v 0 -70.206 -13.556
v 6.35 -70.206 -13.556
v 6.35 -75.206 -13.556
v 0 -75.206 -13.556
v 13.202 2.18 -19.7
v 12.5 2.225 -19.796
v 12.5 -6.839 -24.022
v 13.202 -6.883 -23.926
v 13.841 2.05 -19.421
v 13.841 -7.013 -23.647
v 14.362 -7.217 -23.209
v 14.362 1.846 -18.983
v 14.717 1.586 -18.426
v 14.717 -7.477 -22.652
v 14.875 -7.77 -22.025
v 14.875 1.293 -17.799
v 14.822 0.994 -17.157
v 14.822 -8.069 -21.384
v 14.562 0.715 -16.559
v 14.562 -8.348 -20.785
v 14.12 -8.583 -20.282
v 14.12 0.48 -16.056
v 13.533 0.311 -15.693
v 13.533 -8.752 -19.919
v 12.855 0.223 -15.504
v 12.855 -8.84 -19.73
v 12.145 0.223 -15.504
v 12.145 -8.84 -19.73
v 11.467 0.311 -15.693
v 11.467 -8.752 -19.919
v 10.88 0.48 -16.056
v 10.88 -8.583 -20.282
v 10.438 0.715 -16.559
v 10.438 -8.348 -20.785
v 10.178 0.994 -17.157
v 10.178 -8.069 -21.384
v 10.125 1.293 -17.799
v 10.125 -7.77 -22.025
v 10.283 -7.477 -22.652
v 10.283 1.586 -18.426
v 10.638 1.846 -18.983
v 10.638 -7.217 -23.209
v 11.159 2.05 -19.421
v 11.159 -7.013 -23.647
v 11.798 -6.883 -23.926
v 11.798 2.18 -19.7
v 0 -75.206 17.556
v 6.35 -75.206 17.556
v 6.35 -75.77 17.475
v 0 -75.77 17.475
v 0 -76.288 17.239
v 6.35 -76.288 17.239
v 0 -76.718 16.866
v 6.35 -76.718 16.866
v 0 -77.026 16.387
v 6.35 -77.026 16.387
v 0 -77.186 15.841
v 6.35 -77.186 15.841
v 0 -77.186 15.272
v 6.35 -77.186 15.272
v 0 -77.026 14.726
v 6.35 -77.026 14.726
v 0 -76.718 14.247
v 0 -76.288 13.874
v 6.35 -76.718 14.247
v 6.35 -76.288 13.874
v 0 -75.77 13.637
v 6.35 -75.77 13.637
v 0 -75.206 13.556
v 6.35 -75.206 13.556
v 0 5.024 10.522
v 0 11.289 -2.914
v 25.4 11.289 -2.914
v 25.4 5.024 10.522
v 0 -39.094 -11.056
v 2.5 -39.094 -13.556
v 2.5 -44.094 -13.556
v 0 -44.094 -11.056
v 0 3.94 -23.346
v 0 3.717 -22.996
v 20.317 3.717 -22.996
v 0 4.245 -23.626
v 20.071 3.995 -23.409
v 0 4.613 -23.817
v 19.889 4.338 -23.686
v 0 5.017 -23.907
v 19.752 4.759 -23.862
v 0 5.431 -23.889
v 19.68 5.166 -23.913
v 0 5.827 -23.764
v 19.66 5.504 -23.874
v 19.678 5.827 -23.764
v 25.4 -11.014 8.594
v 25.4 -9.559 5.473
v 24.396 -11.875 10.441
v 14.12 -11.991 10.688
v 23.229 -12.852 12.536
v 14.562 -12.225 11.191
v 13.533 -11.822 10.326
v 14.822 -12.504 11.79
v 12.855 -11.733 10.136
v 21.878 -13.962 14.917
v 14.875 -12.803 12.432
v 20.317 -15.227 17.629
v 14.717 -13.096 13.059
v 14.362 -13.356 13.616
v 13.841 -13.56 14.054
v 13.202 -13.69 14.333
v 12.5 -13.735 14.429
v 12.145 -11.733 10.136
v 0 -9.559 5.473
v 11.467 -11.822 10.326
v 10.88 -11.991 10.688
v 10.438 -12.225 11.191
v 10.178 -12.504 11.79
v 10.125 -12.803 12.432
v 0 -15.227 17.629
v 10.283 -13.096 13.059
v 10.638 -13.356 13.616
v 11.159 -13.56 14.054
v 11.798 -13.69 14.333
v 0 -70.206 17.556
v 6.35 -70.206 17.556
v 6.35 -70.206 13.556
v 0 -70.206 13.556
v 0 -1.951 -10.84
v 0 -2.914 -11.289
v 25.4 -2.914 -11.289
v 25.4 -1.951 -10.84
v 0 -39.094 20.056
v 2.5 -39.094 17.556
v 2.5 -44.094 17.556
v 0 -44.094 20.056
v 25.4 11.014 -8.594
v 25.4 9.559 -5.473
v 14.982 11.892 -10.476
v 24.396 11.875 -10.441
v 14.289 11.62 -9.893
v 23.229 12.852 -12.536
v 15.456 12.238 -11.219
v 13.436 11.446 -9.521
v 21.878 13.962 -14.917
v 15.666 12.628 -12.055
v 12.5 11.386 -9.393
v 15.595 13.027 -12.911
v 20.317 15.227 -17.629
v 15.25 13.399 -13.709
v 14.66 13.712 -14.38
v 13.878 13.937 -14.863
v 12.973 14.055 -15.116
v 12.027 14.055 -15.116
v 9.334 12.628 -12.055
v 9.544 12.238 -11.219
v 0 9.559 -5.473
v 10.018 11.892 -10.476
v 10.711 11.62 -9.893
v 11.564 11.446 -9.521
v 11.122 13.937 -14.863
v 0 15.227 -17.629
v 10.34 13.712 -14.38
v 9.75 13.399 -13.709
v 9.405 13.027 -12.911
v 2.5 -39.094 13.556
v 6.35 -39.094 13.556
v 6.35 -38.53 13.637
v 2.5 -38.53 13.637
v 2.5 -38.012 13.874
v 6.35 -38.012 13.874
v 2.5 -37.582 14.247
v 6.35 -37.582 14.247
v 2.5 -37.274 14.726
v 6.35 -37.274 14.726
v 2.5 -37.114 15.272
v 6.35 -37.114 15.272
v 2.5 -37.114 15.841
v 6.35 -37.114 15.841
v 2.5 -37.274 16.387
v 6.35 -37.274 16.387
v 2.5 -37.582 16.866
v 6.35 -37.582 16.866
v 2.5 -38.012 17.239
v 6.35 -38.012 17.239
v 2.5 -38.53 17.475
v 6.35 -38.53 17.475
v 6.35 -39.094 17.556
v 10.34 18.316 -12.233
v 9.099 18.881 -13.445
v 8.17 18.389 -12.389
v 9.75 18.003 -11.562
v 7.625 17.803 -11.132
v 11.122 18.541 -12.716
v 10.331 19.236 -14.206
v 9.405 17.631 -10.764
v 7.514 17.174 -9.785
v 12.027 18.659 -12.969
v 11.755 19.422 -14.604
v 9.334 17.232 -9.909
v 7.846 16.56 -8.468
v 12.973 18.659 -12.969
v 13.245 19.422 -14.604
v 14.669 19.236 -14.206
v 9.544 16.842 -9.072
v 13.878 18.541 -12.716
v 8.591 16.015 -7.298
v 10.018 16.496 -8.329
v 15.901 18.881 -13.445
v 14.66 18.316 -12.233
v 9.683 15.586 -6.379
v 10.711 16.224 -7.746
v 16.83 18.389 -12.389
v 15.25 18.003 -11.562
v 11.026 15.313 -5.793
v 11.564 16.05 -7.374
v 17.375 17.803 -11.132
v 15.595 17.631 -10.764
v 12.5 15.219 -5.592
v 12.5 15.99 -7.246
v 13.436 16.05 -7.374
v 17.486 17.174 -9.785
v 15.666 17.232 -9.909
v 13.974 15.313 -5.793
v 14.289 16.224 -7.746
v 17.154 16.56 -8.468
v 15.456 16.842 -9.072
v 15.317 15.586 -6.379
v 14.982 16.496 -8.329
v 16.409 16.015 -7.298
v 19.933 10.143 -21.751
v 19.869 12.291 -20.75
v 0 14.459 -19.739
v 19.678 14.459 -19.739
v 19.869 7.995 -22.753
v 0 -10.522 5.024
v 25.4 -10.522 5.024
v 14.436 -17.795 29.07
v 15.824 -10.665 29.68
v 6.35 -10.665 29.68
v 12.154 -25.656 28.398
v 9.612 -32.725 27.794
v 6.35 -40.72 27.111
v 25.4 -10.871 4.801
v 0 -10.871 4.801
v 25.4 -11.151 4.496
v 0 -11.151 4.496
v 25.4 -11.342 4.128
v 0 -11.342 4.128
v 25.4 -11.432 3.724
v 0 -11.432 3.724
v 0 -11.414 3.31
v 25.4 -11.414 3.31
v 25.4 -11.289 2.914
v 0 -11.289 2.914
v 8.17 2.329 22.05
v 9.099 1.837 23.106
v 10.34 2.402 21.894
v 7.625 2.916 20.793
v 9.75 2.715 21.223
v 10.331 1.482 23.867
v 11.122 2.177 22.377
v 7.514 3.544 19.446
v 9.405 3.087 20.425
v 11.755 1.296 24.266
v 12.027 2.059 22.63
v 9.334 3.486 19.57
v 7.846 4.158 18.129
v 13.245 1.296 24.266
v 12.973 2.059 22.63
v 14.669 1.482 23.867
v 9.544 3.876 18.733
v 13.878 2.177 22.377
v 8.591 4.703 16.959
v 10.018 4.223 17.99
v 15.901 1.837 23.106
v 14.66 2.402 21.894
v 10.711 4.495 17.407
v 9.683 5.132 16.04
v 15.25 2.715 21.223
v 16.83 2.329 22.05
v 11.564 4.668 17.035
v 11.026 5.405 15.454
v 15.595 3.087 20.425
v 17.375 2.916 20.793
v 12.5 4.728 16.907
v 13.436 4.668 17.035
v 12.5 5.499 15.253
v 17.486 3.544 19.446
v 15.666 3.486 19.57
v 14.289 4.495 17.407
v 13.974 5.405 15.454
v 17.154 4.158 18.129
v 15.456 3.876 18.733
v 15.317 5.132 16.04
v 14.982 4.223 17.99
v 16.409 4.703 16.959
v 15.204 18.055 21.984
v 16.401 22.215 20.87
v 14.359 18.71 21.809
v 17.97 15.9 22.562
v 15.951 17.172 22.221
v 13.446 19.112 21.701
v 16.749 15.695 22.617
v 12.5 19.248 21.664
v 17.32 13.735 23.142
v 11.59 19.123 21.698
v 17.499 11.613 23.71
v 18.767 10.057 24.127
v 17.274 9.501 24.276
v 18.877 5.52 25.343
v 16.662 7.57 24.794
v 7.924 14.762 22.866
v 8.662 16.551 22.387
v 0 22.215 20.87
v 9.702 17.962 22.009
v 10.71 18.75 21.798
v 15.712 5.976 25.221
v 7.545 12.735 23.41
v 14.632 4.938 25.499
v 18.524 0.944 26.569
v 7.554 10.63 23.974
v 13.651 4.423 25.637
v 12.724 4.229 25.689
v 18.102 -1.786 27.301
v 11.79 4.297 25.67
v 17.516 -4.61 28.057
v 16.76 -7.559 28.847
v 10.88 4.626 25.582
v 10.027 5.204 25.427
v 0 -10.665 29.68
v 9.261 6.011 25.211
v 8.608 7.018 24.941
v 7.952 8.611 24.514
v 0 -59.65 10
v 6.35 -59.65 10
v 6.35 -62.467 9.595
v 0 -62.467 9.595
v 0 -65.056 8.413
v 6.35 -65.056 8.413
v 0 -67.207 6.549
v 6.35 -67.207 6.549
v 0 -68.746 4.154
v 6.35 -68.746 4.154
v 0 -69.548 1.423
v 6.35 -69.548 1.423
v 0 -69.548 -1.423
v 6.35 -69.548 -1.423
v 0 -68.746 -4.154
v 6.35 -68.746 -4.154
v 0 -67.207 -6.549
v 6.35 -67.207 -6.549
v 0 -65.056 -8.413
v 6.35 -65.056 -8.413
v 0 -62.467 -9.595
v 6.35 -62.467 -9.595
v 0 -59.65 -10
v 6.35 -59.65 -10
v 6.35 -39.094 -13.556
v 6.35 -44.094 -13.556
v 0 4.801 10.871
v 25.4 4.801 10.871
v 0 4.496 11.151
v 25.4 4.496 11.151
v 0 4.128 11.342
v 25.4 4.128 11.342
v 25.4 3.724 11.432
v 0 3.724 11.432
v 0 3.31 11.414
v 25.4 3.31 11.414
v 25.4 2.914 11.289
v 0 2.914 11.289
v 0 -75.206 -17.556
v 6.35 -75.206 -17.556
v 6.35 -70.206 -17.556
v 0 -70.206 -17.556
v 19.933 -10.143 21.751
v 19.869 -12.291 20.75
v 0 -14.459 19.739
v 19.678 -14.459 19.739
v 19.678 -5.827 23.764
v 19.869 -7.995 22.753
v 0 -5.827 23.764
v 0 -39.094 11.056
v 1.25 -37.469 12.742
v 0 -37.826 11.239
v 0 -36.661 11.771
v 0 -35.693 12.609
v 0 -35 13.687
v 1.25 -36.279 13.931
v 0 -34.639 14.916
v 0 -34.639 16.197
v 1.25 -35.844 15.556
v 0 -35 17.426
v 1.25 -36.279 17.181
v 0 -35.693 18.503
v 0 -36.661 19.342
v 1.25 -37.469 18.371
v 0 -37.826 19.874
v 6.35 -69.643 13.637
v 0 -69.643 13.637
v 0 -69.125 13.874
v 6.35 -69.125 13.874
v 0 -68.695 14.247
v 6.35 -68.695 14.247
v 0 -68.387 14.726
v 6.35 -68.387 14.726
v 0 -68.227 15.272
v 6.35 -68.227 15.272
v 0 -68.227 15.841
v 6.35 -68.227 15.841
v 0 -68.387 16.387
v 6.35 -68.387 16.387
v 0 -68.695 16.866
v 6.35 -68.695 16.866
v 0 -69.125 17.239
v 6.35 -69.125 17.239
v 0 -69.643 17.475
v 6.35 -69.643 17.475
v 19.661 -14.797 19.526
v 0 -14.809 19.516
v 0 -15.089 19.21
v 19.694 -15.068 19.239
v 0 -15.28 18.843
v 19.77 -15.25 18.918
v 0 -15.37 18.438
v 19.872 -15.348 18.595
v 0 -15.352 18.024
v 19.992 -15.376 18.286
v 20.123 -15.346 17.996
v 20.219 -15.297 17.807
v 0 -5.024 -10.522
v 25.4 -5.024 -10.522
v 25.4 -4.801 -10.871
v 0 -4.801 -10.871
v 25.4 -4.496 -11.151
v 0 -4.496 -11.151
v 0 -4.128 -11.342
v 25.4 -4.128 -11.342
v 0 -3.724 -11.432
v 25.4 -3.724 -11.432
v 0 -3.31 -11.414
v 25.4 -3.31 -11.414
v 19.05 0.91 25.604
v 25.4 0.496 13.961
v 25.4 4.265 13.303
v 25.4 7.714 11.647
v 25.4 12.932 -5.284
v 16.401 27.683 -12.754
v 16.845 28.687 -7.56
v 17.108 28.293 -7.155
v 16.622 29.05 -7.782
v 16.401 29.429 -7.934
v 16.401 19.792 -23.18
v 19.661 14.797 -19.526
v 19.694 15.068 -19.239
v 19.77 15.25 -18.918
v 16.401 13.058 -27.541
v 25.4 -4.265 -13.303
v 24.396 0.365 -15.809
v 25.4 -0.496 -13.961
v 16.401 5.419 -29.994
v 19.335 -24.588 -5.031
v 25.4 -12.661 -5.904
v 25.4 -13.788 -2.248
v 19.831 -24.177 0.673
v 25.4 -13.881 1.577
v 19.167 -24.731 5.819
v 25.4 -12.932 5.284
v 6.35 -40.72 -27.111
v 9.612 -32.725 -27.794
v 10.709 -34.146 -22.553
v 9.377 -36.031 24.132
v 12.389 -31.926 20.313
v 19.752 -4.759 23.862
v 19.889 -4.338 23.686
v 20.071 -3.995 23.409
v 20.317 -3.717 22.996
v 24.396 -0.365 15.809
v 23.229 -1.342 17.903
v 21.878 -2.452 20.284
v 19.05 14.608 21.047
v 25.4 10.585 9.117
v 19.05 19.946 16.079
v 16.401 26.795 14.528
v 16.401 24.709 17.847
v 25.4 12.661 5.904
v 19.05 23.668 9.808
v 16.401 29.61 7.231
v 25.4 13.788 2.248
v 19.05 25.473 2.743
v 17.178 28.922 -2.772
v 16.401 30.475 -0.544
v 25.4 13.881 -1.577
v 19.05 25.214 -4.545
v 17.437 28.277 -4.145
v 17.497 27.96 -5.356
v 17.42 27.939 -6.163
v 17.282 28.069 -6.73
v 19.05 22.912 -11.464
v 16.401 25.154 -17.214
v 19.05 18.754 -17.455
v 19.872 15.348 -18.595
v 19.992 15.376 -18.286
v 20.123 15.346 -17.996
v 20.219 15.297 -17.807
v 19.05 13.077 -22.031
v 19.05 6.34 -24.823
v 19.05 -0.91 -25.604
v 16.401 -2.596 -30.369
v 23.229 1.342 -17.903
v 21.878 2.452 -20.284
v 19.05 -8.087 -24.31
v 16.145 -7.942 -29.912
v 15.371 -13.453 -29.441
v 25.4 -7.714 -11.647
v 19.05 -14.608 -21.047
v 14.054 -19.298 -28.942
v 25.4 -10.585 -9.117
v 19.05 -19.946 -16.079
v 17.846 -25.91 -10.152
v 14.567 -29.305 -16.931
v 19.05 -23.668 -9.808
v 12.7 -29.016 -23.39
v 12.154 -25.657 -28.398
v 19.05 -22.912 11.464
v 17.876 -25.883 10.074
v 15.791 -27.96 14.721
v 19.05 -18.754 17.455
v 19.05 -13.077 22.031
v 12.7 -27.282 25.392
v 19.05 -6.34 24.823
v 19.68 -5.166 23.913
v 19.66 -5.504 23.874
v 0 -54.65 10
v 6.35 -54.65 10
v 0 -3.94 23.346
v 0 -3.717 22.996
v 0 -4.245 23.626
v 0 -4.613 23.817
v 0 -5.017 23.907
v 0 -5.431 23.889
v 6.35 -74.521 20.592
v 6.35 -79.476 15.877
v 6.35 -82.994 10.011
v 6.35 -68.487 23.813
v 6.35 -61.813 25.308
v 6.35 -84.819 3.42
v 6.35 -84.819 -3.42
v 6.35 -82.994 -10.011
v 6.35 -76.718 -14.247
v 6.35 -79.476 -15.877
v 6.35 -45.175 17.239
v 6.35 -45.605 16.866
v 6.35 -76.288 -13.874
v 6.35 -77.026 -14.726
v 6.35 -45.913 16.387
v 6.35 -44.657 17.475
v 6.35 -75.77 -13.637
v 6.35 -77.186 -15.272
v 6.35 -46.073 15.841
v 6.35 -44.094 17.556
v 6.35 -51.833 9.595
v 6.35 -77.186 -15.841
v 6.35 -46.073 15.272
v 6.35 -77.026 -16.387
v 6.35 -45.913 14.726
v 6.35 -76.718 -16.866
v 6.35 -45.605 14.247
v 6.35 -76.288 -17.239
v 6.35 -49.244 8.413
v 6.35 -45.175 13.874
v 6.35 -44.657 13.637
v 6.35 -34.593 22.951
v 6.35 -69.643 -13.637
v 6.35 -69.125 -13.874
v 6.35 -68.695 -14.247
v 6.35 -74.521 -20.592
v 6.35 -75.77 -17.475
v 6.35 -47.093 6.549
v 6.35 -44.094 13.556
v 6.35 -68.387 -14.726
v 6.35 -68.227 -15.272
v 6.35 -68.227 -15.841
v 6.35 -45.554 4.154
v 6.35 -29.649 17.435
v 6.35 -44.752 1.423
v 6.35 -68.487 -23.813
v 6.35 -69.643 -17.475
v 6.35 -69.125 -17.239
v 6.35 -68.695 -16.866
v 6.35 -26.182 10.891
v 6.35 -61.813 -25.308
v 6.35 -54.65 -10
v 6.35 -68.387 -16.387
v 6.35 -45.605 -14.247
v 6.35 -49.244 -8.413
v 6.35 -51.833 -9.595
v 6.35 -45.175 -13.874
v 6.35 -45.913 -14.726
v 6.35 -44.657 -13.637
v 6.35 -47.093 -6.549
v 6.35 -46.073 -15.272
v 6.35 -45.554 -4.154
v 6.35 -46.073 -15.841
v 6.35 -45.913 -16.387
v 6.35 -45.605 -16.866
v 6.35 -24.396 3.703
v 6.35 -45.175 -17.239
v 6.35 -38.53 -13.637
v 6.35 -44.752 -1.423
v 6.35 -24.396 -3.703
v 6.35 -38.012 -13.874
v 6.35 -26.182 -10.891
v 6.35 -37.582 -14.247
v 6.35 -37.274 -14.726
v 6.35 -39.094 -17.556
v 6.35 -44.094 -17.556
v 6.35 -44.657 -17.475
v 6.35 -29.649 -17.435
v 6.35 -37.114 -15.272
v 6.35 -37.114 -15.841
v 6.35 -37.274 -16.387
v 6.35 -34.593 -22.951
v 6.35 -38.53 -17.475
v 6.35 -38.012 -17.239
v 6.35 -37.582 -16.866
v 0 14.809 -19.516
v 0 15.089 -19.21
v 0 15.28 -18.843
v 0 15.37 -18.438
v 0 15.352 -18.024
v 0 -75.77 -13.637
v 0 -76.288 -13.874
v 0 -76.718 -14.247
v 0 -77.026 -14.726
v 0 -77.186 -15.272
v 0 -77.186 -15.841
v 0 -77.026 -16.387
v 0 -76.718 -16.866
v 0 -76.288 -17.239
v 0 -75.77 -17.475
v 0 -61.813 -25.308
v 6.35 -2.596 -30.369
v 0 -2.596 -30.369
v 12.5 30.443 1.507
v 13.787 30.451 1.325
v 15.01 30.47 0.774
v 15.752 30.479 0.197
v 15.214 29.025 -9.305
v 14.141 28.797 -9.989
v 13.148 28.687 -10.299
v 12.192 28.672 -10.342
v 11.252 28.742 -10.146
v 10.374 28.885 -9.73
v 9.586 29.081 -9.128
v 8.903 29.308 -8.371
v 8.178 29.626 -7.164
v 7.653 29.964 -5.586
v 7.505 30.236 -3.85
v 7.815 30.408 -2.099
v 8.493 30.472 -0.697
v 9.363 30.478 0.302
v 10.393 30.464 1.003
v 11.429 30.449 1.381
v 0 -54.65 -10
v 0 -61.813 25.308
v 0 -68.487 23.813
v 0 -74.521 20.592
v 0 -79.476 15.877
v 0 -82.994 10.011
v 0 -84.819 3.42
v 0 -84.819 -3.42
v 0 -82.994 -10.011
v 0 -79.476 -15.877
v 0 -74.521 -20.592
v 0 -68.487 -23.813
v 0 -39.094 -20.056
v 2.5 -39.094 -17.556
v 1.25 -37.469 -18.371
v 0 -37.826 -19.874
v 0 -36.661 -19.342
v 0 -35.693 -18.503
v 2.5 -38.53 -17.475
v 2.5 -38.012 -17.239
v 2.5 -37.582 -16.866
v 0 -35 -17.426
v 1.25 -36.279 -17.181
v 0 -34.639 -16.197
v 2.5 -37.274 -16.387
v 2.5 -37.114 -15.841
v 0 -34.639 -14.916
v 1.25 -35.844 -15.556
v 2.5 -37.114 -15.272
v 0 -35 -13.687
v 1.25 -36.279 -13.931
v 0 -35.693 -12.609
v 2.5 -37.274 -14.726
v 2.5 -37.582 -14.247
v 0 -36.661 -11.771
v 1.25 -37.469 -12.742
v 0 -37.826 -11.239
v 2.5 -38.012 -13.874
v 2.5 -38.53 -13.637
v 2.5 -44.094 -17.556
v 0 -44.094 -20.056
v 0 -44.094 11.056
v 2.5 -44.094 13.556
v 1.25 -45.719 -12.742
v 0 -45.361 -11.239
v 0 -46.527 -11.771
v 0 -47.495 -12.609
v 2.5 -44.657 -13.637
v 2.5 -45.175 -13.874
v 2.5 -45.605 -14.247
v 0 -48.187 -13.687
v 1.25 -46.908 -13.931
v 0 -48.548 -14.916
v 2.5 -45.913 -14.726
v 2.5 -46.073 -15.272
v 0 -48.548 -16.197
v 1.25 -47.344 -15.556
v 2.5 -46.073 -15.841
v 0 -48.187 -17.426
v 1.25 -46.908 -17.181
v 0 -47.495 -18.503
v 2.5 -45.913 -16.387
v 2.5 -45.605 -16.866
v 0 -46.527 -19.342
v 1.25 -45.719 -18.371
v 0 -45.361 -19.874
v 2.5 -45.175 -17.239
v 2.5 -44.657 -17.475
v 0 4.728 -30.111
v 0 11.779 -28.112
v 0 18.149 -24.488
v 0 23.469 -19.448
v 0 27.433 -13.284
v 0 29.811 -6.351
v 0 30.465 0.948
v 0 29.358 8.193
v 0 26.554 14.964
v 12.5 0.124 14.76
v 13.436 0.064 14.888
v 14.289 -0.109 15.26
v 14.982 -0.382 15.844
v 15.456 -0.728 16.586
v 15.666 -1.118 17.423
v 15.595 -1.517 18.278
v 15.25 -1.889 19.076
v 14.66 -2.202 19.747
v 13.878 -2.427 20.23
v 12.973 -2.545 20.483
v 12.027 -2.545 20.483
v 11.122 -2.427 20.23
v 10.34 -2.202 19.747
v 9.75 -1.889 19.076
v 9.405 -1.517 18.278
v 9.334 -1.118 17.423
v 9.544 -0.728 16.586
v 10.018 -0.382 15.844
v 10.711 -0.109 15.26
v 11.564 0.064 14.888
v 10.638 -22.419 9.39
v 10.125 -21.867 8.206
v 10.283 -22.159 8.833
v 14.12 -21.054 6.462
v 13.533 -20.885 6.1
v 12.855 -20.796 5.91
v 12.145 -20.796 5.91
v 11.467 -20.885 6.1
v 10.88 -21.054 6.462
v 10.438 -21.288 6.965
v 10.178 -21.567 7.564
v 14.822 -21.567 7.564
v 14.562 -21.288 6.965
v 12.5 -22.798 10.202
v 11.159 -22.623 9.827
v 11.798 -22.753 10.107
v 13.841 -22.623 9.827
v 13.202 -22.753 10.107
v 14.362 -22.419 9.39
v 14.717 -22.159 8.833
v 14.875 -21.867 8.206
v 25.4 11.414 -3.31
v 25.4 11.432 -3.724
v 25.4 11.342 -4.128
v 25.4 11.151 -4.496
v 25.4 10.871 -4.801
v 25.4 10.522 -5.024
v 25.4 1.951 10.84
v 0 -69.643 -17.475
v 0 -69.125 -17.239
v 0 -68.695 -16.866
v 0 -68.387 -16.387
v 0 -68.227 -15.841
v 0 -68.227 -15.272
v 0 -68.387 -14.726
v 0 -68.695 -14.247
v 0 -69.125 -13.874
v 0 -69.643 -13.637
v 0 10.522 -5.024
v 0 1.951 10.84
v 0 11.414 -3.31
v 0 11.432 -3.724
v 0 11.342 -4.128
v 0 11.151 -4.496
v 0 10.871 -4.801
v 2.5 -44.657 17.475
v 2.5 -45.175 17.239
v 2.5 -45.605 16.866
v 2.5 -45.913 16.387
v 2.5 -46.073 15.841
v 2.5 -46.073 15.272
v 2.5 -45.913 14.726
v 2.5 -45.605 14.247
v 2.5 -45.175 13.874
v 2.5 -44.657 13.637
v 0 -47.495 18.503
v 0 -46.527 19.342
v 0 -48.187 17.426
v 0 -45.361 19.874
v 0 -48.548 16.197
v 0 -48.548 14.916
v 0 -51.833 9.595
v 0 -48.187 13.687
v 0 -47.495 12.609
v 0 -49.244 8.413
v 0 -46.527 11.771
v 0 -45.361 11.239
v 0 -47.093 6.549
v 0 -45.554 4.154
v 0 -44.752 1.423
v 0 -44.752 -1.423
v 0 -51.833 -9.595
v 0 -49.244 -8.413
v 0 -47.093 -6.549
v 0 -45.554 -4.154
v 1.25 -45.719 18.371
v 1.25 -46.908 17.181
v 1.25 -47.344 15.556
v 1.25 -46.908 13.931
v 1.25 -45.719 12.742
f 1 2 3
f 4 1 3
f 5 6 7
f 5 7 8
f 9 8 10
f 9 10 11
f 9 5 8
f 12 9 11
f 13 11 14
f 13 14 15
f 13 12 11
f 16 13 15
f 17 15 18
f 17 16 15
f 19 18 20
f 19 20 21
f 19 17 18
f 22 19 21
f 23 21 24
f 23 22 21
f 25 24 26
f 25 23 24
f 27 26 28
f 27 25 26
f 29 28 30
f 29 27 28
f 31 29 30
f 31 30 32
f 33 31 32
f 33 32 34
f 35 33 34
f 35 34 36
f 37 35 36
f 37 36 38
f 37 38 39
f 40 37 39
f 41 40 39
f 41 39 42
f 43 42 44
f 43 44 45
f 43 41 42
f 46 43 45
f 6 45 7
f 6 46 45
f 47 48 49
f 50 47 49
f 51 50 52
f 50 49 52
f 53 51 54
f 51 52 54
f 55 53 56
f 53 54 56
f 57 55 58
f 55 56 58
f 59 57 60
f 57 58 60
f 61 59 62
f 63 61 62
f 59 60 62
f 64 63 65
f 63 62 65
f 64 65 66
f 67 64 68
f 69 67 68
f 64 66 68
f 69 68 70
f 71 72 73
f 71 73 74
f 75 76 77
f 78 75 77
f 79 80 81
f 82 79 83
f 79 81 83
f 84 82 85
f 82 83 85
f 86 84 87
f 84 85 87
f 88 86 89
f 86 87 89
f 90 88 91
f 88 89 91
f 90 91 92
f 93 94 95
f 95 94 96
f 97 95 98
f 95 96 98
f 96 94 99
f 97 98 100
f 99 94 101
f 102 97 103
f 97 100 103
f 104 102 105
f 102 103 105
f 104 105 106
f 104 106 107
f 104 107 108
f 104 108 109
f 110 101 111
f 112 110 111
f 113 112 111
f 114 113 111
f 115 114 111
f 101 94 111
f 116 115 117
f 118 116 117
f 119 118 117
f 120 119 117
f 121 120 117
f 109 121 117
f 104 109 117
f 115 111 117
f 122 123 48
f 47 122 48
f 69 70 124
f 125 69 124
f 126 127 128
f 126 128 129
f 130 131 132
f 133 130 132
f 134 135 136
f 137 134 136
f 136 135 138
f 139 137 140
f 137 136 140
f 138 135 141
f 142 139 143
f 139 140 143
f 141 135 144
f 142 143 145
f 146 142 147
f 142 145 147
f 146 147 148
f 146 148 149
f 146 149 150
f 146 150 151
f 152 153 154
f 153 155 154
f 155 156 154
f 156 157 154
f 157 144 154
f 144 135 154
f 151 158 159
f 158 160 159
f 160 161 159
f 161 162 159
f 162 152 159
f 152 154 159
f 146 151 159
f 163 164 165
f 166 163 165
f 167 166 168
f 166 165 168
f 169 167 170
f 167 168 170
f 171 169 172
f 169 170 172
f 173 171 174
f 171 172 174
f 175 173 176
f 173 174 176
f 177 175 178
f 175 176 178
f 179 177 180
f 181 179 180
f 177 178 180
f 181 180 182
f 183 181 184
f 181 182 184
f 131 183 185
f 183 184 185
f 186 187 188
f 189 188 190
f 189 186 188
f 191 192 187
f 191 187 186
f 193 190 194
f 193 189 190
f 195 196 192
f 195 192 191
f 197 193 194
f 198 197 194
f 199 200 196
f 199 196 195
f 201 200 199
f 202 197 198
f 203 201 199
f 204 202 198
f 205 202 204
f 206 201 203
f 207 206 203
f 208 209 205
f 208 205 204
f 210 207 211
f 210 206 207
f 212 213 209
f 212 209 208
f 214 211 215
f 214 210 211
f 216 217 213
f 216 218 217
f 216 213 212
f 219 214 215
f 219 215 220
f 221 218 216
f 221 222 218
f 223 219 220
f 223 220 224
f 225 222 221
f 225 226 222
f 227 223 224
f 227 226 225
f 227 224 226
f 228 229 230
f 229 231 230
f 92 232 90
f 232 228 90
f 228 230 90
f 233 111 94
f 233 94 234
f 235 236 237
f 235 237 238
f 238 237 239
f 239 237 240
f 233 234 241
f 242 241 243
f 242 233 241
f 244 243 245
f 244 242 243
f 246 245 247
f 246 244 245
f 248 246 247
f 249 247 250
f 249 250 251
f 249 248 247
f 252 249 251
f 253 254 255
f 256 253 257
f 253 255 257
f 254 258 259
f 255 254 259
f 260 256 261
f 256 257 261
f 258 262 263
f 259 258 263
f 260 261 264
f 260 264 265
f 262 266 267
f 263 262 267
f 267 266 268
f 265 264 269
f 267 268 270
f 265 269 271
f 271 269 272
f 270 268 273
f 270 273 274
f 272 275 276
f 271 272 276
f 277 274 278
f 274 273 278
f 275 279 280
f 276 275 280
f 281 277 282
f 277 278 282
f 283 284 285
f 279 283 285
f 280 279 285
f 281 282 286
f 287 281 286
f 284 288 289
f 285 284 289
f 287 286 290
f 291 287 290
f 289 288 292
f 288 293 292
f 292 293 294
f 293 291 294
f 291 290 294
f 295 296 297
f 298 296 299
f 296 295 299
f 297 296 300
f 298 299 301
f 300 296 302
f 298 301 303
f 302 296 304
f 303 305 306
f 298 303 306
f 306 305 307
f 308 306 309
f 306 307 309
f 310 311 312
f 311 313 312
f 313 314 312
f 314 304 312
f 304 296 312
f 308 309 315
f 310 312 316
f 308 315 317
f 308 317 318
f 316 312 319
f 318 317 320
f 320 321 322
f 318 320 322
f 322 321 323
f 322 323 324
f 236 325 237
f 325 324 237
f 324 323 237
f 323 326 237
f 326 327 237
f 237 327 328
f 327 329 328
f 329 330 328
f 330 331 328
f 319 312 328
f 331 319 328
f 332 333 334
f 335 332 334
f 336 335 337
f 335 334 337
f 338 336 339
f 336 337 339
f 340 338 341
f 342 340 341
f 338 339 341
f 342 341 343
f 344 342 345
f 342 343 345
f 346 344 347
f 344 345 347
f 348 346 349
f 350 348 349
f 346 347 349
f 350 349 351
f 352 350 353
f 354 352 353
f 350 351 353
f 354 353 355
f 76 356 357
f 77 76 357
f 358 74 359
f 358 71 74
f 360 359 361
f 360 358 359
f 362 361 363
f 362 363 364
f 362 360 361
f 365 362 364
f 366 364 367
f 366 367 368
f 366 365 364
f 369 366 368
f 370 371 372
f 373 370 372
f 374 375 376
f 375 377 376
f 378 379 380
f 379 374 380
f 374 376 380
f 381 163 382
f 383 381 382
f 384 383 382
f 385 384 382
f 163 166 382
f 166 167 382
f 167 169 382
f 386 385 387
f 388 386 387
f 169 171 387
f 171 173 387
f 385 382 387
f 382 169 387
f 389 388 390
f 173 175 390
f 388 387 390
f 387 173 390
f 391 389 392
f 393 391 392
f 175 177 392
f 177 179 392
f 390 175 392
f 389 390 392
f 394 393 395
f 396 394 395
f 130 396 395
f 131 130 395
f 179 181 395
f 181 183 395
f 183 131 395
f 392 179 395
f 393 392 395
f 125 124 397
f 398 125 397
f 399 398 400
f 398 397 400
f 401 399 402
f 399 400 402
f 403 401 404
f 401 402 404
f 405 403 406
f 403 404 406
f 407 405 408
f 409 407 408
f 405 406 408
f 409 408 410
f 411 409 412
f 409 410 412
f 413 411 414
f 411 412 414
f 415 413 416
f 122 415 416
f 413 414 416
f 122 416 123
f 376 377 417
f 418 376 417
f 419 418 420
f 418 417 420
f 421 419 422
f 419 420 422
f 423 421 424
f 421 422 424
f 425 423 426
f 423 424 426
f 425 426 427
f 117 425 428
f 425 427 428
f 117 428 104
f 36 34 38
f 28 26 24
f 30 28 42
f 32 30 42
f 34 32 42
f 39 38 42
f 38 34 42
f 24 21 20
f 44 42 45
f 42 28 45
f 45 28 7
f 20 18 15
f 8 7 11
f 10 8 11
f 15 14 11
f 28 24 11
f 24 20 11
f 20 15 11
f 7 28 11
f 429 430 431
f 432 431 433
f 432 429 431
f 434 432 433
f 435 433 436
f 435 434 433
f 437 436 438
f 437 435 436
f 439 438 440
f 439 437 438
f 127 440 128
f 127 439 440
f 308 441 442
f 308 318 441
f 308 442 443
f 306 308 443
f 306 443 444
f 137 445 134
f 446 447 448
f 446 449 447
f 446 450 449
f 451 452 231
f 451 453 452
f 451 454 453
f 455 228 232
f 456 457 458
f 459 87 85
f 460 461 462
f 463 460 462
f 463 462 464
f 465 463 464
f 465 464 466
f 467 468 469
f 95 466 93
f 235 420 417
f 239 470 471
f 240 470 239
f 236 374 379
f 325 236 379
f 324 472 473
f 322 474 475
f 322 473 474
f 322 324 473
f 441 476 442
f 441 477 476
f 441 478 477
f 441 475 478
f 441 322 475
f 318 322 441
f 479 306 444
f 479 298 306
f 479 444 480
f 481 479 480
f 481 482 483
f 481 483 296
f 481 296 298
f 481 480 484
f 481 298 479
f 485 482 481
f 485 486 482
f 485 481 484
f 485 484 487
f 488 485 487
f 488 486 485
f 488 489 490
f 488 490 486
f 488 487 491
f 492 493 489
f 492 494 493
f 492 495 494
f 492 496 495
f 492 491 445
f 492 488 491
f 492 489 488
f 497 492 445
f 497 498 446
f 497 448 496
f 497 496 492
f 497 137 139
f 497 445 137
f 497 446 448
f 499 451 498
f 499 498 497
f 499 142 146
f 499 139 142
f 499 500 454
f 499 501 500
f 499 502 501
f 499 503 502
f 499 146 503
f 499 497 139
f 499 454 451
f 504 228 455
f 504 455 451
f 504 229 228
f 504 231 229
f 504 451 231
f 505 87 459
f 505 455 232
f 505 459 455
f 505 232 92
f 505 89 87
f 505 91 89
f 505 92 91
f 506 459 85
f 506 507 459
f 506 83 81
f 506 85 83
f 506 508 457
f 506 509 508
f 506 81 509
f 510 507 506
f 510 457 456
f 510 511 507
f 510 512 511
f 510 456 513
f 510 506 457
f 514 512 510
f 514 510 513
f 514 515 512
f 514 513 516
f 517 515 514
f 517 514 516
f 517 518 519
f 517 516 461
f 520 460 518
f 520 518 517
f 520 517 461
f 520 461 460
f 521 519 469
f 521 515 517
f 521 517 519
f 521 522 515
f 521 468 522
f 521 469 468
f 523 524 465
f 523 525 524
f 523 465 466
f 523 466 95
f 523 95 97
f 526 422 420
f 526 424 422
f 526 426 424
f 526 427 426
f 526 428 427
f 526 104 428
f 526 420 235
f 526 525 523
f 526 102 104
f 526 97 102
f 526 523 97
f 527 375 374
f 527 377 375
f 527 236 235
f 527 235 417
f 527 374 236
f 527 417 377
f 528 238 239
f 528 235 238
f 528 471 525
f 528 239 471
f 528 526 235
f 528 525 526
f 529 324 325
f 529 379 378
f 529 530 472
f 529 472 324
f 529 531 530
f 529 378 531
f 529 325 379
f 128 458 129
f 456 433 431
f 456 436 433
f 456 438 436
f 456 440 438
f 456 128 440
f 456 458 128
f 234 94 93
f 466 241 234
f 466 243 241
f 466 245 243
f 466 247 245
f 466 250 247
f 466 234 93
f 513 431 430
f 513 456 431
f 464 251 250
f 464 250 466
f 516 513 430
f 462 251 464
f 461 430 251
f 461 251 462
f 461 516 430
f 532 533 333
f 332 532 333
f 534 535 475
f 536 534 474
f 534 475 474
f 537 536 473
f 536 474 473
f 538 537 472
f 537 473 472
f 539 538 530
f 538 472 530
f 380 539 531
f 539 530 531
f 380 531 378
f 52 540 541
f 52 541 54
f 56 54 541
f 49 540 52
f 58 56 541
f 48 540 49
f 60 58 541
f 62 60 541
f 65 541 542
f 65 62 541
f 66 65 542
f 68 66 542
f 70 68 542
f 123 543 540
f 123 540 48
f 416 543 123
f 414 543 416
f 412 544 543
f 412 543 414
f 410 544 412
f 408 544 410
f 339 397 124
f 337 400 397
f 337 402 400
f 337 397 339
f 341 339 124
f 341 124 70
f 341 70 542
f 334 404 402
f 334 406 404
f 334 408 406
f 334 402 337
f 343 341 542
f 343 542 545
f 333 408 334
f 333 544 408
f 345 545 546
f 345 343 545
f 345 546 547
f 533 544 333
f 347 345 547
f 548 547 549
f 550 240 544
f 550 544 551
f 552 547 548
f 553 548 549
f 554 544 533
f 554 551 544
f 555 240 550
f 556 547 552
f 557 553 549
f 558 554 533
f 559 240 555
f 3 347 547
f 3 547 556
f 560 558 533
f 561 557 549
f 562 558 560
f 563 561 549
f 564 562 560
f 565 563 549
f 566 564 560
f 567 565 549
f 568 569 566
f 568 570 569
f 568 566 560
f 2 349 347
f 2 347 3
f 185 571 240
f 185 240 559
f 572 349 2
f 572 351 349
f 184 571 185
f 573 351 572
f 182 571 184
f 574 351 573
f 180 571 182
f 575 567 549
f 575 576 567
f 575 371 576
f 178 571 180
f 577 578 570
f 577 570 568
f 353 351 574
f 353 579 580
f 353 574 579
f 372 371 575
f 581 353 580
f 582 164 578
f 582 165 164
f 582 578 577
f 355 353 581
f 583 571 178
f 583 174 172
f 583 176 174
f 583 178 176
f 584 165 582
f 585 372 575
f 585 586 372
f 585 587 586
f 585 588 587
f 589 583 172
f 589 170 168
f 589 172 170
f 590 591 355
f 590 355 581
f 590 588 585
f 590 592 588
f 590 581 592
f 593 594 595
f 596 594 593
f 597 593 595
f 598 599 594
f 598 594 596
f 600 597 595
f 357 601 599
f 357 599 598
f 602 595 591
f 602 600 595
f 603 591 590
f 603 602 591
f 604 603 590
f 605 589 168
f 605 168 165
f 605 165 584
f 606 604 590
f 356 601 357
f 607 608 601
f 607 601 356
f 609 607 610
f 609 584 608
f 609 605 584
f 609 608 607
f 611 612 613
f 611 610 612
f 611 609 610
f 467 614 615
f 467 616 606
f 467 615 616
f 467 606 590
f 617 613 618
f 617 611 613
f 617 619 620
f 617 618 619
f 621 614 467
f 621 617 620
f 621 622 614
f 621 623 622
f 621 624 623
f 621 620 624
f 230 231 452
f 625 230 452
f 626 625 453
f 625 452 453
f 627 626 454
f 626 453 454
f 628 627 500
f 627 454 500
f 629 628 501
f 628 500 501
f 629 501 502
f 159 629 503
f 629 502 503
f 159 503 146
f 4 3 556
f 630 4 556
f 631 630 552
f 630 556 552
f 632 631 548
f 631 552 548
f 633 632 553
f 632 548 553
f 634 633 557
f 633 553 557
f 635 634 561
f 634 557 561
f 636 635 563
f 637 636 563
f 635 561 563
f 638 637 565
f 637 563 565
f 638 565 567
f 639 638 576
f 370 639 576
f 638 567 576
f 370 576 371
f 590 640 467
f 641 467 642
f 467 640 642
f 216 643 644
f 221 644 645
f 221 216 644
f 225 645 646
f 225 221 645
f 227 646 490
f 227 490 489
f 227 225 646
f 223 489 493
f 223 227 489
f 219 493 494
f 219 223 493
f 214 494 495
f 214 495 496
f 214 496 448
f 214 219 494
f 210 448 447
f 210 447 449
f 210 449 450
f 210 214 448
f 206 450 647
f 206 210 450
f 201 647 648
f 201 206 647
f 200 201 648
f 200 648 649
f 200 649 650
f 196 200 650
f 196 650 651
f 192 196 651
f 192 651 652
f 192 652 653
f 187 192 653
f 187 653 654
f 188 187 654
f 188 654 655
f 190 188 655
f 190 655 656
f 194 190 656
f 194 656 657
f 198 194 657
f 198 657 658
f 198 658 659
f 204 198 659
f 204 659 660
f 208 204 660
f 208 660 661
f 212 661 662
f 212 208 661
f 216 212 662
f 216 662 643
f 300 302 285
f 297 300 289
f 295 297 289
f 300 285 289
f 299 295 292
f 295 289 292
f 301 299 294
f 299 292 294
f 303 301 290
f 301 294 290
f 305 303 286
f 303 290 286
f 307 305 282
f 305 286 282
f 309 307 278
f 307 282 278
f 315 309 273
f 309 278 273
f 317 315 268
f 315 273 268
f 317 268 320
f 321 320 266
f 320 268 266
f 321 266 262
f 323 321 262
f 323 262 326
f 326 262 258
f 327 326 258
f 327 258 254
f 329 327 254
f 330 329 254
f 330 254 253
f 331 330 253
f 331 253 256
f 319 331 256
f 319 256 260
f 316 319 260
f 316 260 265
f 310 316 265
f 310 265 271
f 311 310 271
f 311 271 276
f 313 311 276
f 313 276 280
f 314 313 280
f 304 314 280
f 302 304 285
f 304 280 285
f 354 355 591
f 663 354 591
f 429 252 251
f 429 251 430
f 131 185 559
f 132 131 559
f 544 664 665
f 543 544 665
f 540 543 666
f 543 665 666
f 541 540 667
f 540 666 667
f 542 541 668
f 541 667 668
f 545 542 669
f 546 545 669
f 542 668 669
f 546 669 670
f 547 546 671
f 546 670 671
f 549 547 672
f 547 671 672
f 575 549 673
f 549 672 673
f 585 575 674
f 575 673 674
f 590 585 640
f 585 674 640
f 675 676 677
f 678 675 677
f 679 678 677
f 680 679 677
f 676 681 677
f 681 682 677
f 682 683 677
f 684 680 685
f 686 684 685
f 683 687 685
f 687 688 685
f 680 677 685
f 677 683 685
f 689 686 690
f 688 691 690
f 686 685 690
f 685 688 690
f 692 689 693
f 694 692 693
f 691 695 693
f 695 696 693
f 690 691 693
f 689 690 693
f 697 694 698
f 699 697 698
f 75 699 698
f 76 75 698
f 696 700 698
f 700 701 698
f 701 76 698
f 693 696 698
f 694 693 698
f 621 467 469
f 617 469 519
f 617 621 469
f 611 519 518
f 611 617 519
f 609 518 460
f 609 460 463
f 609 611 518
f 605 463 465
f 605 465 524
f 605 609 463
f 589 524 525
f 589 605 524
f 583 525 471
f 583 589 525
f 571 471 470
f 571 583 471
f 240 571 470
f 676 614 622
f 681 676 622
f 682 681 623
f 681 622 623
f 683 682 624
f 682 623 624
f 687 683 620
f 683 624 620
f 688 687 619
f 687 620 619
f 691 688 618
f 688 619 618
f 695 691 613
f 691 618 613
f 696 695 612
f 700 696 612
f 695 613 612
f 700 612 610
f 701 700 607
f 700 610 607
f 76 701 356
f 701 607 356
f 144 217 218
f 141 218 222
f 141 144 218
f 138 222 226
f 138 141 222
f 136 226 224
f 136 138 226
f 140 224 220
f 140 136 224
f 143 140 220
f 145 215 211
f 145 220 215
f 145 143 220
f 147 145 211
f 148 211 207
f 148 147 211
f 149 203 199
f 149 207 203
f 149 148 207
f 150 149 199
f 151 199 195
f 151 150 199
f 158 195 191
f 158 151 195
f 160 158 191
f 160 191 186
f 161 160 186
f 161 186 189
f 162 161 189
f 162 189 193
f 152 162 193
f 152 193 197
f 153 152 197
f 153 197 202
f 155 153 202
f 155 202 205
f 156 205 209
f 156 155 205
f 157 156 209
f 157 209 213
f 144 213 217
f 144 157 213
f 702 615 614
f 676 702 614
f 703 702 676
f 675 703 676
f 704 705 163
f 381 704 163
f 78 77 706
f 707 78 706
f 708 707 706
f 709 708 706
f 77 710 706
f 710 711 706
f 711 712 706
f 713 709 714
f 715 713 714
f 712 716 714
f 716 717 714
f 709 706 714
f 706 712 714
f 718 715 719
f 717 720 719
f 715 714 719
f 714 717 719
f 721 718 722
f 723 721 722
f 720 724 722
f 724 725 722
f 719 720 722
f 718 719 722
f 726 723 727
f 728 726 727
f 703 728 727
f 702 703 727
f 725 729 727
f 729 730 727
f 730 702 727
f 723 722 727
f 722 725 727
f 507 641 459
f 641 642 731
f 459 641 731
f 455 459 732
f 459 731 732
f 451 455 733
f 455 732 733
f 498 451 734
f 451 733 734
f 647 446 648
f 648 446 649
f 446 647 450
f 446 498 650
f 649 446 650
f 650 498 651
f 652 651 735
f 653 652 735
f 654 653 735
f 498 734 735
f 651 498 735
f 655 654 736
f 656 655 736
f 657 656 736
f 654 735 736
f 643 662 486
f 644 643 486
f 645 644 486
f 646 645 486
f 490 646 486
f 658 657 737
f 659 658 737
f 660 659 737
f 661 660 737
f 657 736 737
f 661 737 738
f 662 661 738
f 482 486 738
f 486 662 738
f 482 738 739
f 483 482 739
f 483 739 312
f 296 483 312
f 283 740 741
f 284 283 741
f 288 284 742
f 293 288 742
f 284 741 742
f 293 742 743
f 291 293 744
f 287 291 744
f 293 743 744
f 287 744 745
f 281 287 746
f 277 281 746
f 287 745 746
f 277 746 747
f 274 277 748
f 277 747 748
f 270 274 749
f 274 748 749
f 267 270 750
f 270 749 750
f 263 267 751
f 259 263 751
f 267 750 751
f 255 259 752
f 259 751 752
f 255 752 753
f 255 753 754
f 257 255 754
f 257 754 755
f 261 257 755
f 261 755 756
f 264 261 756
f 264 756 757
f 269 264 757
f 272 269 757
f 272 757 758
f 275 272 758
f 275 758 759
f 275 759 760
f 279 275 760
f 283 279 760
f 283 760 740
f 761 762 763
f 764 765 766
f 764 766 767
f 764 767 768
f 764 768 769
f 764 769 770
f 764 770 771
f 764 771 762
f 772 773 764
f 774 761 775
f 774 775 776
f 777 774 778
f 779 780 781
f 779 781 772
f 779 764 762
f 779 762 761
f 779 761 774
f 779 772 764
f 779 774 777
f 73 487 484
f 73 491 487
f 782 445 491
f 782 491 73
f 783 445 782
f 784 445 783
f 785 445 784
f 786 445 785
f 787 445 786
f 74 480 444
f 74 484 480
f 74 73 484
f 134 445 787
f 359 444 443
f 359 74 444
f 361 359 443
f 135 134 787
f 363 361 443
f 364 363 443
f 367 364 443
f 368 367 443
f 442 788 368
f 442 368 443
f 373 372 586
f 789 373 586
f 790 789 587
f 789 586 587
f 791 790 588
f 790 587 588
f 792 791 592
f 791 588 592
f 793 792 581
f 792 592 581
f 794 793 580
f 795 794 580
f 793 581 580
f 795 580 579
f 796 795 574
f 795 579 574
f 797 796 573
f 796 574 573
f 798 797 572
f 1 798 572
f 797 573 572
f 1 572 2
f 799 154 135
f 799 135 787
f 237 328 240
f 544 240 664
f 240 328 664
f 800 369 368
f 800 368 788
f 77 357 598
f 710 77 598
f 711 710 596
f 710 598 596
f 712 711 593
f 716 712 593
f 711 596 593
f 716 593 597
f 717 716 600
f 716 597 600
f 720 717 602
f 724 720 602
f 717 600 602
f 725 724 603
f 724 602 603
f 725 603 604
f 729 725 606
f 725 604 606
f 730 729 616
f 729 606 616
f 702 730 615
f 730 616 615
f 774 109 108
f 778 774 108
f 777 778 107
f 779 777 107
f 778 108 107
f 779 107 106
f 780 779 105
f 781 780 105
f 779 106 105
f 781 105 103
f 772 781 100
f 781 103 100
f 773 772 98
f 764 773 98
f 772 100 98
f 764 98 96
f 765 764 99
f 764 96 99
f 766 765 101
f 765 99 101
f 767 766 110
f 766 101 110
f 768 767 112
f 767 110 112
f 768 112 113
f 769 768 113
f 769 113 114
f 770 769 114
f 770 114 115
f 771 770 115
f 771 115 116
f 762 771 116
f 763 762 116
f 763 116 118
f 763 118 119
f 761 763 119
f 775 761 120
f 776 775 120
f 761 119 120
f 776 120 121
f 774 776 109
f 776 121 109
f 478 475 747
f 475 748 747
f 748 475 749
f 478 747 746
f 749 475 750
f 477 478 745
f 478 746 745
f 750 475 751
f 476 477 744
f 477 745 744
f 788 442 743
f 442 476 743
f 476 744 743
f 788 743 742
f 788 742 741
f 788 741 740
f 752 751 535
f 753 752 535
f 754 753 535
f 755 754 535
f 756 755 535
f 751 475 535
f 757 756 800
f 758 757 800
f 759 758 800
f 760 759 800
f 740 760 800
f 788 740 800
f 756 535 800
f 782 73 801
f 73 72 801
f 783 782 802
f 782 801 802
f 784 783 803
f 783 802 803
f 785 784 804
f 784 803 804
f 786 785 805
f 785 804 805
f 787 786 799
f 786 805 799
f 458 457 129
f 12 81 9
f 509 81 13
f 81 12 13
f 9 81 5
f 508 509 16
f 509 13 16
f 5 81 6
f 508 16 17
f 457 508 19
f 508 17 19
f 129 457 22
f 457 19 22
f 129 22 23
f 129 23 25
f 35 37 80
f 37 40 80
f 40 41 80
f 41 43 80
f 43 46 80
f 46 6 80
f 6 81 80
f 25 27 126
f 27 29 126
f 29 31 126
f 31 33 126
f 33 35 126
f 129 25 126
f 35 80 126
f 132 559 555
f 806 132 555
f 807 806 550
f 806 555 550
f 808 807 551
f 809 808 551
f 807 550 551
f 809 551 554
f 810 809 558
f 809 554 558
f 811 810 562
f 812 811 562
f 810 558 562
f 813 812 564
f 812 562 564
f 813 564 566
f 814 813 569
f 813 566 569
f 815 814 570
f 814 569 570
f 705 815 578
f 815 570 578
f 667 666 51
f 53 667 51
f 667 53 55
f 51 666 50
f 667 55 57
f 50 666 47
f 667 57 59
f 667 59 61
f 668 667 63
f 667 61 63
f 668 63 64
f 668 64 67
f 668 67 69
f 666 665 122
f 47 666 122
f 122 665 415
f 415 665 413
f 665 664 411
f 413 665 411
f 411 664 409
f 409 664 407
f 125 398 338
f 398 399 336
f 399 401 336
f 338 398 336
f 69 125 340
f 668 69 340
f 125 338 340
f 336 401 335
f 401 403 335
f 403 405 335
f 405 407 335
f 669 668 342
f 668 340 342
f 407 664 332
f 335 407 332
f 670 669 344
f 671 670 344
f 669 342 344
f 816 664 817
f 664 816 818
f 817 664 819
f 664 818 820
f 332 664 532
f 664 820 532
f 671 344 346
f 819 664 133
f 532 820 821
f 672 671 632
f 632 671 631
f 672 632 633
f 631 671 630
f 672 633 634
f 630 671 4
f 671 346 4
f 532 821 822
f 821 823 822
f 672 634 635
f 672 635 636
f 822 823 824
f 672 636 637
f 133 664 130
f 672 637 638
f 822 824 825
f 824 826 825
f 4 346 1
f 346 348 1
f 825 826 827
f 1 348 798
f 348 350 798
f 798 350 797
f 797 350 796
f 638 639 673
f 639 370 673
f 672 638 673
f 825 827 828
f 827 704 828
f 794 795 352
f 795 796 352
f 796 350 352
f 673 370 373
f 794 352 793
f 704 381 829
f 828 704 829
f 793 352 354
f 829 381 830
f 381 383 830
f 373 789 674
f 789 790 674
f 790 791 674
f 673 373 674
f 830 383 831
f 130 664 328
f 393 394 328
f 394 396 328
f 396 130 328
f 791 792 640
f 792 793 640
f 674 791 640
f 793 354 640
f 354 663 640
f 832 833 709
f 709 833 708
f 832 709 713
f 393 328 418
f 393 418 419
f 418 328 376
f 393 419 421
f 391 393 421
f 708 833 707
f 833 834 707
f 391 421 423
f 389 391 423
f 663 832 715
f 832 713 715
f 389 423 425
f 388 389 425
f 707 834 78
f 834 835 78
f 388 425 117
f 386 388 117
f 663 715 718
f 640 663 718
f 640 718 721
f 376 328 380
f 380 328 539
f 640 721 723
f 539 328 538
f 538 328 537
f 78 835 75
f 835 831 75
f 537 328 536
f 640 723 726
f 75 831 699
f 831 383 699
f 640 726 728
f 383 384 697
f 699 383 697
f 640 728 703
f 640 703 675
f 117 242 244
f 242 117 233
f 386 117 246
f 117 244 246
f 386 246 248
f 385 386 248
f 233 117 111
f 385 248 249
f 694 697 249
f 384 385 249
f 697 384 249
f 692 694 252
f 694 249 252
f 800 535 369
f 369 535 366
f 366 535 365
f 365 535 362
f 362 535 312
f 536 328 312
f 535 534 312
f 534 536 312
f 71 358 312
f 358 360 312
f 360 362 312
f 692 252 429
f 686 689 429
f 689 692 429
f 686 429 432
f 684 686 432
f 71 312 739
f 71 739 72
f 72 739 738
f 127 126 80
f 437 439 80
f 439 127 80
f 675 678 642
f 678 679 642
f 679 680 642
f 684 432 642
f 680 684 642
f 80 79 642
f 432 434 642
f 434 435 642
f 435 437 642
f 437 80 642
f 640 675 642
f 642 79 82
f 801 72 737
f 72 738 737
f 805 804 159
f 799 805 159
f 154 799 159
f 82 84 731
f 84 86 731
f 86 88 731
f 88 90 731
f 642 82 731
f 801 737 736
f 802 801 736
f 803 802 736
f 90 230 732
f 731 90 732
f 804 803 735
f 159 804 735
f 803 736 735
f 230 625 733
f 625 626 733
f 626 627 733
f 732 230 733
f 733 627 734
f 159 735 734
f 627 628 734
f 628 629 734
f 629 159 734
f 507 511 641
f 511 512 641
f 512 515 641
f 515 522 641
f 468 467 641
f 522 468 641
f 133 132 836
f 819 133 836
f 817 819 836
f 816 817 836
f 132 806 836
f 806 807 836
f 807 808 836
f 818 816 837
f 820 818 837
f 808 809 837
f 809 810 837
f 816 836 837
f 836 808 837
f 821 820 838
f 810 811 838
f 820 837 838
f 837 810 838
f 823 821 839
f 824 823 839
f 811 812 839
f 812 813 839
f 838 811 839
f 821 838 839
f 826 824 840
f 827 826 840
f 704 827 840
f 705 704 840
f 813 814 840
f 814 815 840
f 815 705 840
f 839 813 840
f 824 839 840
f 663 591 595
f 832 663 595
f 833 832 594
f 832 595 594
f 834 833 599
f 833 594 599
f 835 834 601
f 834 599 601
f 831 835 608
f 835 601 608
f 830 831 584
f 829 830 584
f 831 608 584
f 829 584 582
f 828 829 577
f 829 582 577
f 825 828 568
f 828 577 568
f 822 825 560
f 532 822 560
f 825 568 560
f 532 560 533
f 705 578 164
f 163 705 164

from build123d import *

# Parameters (mm, degrees)
BOSS_EXTRUDE1_DEPTH = 6.35
CUT_EXTRUDE18_DEPTH = 10
SKETCH20_R          = 57.15
BOSS_EXTRUDE5_DEPTH = 19.05
CUT_EXTRUDE14_DEPTH = 106.568863781
SKETCH22_R          = 3.175
CUT_EXTRUDE15_DEPTH = 112.672649781
SKETCH24_R          = 5
CUT_EXTRUDE16_DEPTH = 117.574618566
SKETCH25_R          = 2.38125
CUT_EXTRUDE17_DEPTH = 10
CHAMFER2_SIZE       = 2.5
FILLET1_R           = 1.5875
SKETCH28_R          = 30.48
CUT_EXTRUDE19_DEPTH = 105.22344993
CUT_EXTRUDE20_DEPTH = 100.947550226
CUT_EXTRUDE21_DEPTH = 94.849309593


with BuildPart() as part:
    # Sketch1 → Boss-Extrude1 (new body)
    with BuildSketch(Plane(origin=(0, 0, 0), x_dir=(0, 0, -1), z_dir=(1, 0, 0))):
        with BuildLine():
            Line((-30.369265969, -2.595782062), (-25.307721641, -61.813151718))
            ThreePointArc((-25.307721641, -61.813151718), (0, -85.05), (25.307721641, -61.813151718))
            Line((25.307721641, -61.813151718), (30.369265969, -2.595782062))
            ThreePointArc((30.369265969, -2.595782062), (0, 30.48), (-30.369265969, -2.595782062))
        make_face()
        Polygon((4.353205728, 11.960334439), (-11.960334439, 4.353205728), (-4.353205728, -11.960334439), (11.960334439, -4.353205728), align=None, mode=Mode.SUBTRACT)
    extrude(amount=BOSS_EXTRUDE1_DEPTH)

    # Sketch19 → Cut-Extrude18 (cut)
    with BuildSketch(Plane(origin=(6.35, 0, 0), x_dir=(0, 0, -1), z_dir=(1, 0, 0))):
        with BuildLine():
            Line((13.556349186, -39.093650814), (13.556349186, -44.093650814))
            ThreePointArc((13.556349186, -44.093650814), (15.556349186, -46.093650814), (17.556349186, -44.093650814))
            Line((17.556349186, -44.093650814), (17.556349186, -39.093650806))
            ThreePointArc((17.556349186, -39.093650806), (15.556349182, -37.093650814), (13.556349186, -39.093650814))
        make_face()
        with BuildLine():
            Line((-10, -54.65), (-10, -59.65))
            ThreePointArc((-10, -59.65), (0, -69.65), (10, -59.65))
            Line((10, -59.65), (10, -54.65))
            ThreePointArc((10, -54.65), (0, -44.65), (-10, -54.65))
        make_face()
        with BuildLine():
            Line((17.556349186, -75.206349194), (17.556349186, -70.206349186))
            ThreePointArc((17.556349186, -70.206349186), (15.556349186, -68.206349186), (13.556349186, -70.206349186))
            Line((13.556349186, -70.206349186), (13.556349186, -75.206349186))
            ThreePointArc((13.556349186, -75.206349186), (15.556349182, -77.206349186), (17.556349186, -75.206349194))
        make_face()
        with BuildLine():
            Line((-17.556349186, -39.093650806), (-17.556349186, -44.093650814))
            ThreePointArc((-17.556349186, -44.093650814), (-15.556349186, -46.093650814), (-13.556349186, -44.093650814))
            Line((-13.556349186, -44.093650814), (-13.556349186, -39.093650814))
            ThreePointArc((-13.556349186, -39.093650814), (-15.556349182, -37.093650814), (-17.556349186, -39.093650806))
        make_face()
        with BuildLine():
            Line((-13.556349186, -75.206349186), (-13.556349186, -70.206349186))
            ThreePointArc((-13.556349186, -70.206349186), (-15.556349186, -68.206349186), (-17.556349186, -70.206349186))
            Line((-17.556349186, -70.206349186), (-17.556349186, -75.206349194))
            ThreePointArc((-17.556349186, -75.206349194), (-15.556349182, -77.206349186), (-13.556349186, -75.206349186))
        make_face()
    extrude(amount=-CUT_EXTRUDE18_DEPTH, mode=Mode.SUBTRACT)

    # Sketch20 → Boss-Extrude5 (add)
    with BuildSketch(Plane(origin=(6.35, 0, 0), x_dir=(0, 0, -1), z_dir=(1, 0, 0))):
        with Locations(Location((0, 0, 0), (0, 0, 242.654471511))):
            Circle(SKETCH20_R)
    extrude(amount=BOSS_EXTRUDE5_DEPTH)

    # Sketch21 → Cut-Extrude14 (cut, through all)
    with BuildSketch(Plane.ZY):
        Polygon((-19.067760927, 15.897892729), (-24.435012851, 4.387783834), (-10.840396045, -1.951490092), (-5.473144121, 9.558618803), align=None)
        Polygon((-11.960334439, -4.353205728), (-4.353205728, 11.960334439), (11.960334439, 4.353205728), (4.353205728, -11.960334439), align=None)
        Polygon((10.840396045, 1.951490092), (5.473144121, -9.558618803), (19.067760927, -15.897892729), (24.435012851, -4.387783834), align=None)
    extrude(amount=-CUT_EXTRUDE14_DEPTH, mode=Mode.SUBTRACT)

    # Sketch22 → Cut-Extrude15 (cut, through all)
    with BuildSketch(Plane(origin=(0, 5.755054448, 2.683625962), x_dir=(-1, 0, 0), z_dir=(0, -0.9063077870366495, -0.4226182617407005))):
        with Locations(Location((-12.5, -16.5, 0), (0, 0, 90))):
            Circle(SKETCH22_R)
    cut_extrude15 = extrude(amount=-CUT_EXTRUDE15_DEPTH, mode=Mode.SUBTRACT)

    # Sketch24 → Cut-Extrude16 (cut, through all)
    with BuildSketch(Plane(origin=(0, 10.359098006, 4.830526732), x_dir=(-1, 0, 0), z_dir=(0, -0.9063077870366495, -0.4226182617407005))):
        with Locations(Location((-12.5, -16.5, 0), (0, 0, 90))):
            Circle(SKETCH24_R)
    cut_extrude16 = extrude(amount=-CUT_EXTRUDE16_DEPTH, mode=Mode.SUBTRACT)

    # Sketch25 → Cut-Extrude17 (cut)
    with BuildSketch(Plane(origin=(0, -5.755054448, -2.683625962), x_dir=(1, 0, 0), z_dir=(0, 0.9063077870366495, 0.4226182617407006))):
        with Locations(Location((12.5, -16.5, 0), (0, 0, 270))):
            Circle(SKETCH25_R)
    cut_extrude17 = extrude(amount=-CUT_EXTRUDE17_DEPTH, mode=Mode.SUBTRACT)

    # Mirror1: Cut-Extrude15, Cut-Extrude16, Cut-Extrude17 across plane
    add(cut_extrude15.mirror(Plane(origin=(0, 0, 0), x_dir=(1, 0, 0), z_dir=(0, 0.42261826174070105, -0.9063077870366493))), mode=Mode.SUBTRACT)
    add(cut_extrude16.mirror(Plane(origin=(0, 0, 0), x_dir=(1, 0, 0), z_dir=(0, 0.42261826174070105, -0.9063077870366493))), mode=Mode.SUBTRACT)
    add(cut_extrude17.mirror(Plane(origin=(0, 0, 0), x_dir=(1, 0, 0), z_dir=(0, 0.42261826174070105, -0.9063077870366493))), mode=Mode.SUBTRACT)


with BuildPart() as body_2:
    # Mirror2: mirrored copy
    add(part.part.mirror(Plane(origin=(0, 0, 0), x_dir=(0, 0, 1), z_dir=(1, 0, 0))))


with BuildPart() as part_1:
    add(part.part)

    # Chamfer2
    chamfer2_edges = [part_1.edges().sort_by_distance(p)[0] for p in [
        (0, -41.593650814, 13.556349186),
        (0, -37.093650814, 15.556349182),
        (0, -41.59365081, 17.556349186),
        (0, -46.093650814, 15.556349186),
        (0, -41.59365081, -17.556349186),
        (0, -37.093650814, -15.556349182),
        (0, -41.593650814, -13.556349186),
        (0, -46.093650814, -15.556349186),
    ]]
    chamfer(chamfer2_edges, length=CHAMFER2_SIZE)

    # Fillet1
    fillet1_edges = [part_1.edges().sort_by_distance(p)[0] for p in [
        (12.7, 4.387783834, -24.435012851),
        (12.7, 15.897892729, -19.067760927),
        (12.7, -4.387783834, 24.435012851),
        (12.7, -15.897892729, 19.067760927),
        (12.7, 11.960334439, -4.353205728),
        (12.7, 4.353205728, 11.960334439),
        (12.7, -11.960334439, 4.353205728),
        (12.7, -4.353205728, -11.960334439),
    ]]
    fillet(fillet1_edges, radius=FILLET1_R)

    # Sketch28 → Cut-Extrude19 (cut, through all)
    with BuildSketch(Plane(origin=(6.35, 0, 0), x_dir=(0, 0, -1), z_dir=(1, 0, 0))):
        with Locations((0, -54.65)):
            Circle(SKETCH28_R)
    extrude(amount=CUT_EXTRUDE19_DEPTH, mode=Mode.SUBTRACT)

    # Sketch31 → Cut-Revolve1 (revolve, cut)
    with BuildSketch(Plane(origin=(0, 0, 0), x_dir=(1, 0, 0), z_dir=(0, 1, 0)), mode=Mode.PRIVATE) as cut_revolve1_sk:
        Polygon((6.35, -59.952108656), (25.4, -59.952108656), (25.4, -13.97), (6.35, -48.91940088), align=None)
    revolve(cut_revolve1_sk.sketch.rotate(Axis((25.4, 0, 0), (-1, 0, 0)), 2.035690426), axis=Axis((25.4, 0, 0), (-1, 0, 0)), mode=Mode.SUBTRACT)

    # Sketch32 → Cut-Extrude20 (cut, through all)
    with BuildSketch(Plane.ZY.offset(-6.35)):
        with BuildLine():
            Line((30.369265969, -2.595782062), (27.110634253, -40.720035521))
            ThreePointArc((27.110634253, -40.720035521), (0, 48.91940088), (-27.110634253, -40.720035521))
            Line((-27.110634253, -40.720035521), (-30.369265969, -2.595782062))
            ThreePointArc((-30.369265969, -2.595782062), (0, 30.48), (30.369265969, -2.595782062))
        make_face()
    extrude(amount=-CUT_EXTRUDE20_DEPTH, mode=Mode.SUBTRACT)

    # Sketch33 → Cut-Extrude21 (cut, through all)
    with BuildSketch(Plane.ZY):
        with BuildLine():
            Line((29.679571242, -10.664842593), (30.369265969, -2.595782062))
            ThreePointArc((30.369265969, -2.595782062), (28.464776298, 10.898940787), (20.869520673, 22.214713747))
            Line((20.869520673, 22.214713747), (29.679571242, -10.664842593))
        make_face()
    extrude(amount=-CUT_EXTRUDE21_DEPTH, mode=Mode.SUBTRACT)


solid = part_1.part
